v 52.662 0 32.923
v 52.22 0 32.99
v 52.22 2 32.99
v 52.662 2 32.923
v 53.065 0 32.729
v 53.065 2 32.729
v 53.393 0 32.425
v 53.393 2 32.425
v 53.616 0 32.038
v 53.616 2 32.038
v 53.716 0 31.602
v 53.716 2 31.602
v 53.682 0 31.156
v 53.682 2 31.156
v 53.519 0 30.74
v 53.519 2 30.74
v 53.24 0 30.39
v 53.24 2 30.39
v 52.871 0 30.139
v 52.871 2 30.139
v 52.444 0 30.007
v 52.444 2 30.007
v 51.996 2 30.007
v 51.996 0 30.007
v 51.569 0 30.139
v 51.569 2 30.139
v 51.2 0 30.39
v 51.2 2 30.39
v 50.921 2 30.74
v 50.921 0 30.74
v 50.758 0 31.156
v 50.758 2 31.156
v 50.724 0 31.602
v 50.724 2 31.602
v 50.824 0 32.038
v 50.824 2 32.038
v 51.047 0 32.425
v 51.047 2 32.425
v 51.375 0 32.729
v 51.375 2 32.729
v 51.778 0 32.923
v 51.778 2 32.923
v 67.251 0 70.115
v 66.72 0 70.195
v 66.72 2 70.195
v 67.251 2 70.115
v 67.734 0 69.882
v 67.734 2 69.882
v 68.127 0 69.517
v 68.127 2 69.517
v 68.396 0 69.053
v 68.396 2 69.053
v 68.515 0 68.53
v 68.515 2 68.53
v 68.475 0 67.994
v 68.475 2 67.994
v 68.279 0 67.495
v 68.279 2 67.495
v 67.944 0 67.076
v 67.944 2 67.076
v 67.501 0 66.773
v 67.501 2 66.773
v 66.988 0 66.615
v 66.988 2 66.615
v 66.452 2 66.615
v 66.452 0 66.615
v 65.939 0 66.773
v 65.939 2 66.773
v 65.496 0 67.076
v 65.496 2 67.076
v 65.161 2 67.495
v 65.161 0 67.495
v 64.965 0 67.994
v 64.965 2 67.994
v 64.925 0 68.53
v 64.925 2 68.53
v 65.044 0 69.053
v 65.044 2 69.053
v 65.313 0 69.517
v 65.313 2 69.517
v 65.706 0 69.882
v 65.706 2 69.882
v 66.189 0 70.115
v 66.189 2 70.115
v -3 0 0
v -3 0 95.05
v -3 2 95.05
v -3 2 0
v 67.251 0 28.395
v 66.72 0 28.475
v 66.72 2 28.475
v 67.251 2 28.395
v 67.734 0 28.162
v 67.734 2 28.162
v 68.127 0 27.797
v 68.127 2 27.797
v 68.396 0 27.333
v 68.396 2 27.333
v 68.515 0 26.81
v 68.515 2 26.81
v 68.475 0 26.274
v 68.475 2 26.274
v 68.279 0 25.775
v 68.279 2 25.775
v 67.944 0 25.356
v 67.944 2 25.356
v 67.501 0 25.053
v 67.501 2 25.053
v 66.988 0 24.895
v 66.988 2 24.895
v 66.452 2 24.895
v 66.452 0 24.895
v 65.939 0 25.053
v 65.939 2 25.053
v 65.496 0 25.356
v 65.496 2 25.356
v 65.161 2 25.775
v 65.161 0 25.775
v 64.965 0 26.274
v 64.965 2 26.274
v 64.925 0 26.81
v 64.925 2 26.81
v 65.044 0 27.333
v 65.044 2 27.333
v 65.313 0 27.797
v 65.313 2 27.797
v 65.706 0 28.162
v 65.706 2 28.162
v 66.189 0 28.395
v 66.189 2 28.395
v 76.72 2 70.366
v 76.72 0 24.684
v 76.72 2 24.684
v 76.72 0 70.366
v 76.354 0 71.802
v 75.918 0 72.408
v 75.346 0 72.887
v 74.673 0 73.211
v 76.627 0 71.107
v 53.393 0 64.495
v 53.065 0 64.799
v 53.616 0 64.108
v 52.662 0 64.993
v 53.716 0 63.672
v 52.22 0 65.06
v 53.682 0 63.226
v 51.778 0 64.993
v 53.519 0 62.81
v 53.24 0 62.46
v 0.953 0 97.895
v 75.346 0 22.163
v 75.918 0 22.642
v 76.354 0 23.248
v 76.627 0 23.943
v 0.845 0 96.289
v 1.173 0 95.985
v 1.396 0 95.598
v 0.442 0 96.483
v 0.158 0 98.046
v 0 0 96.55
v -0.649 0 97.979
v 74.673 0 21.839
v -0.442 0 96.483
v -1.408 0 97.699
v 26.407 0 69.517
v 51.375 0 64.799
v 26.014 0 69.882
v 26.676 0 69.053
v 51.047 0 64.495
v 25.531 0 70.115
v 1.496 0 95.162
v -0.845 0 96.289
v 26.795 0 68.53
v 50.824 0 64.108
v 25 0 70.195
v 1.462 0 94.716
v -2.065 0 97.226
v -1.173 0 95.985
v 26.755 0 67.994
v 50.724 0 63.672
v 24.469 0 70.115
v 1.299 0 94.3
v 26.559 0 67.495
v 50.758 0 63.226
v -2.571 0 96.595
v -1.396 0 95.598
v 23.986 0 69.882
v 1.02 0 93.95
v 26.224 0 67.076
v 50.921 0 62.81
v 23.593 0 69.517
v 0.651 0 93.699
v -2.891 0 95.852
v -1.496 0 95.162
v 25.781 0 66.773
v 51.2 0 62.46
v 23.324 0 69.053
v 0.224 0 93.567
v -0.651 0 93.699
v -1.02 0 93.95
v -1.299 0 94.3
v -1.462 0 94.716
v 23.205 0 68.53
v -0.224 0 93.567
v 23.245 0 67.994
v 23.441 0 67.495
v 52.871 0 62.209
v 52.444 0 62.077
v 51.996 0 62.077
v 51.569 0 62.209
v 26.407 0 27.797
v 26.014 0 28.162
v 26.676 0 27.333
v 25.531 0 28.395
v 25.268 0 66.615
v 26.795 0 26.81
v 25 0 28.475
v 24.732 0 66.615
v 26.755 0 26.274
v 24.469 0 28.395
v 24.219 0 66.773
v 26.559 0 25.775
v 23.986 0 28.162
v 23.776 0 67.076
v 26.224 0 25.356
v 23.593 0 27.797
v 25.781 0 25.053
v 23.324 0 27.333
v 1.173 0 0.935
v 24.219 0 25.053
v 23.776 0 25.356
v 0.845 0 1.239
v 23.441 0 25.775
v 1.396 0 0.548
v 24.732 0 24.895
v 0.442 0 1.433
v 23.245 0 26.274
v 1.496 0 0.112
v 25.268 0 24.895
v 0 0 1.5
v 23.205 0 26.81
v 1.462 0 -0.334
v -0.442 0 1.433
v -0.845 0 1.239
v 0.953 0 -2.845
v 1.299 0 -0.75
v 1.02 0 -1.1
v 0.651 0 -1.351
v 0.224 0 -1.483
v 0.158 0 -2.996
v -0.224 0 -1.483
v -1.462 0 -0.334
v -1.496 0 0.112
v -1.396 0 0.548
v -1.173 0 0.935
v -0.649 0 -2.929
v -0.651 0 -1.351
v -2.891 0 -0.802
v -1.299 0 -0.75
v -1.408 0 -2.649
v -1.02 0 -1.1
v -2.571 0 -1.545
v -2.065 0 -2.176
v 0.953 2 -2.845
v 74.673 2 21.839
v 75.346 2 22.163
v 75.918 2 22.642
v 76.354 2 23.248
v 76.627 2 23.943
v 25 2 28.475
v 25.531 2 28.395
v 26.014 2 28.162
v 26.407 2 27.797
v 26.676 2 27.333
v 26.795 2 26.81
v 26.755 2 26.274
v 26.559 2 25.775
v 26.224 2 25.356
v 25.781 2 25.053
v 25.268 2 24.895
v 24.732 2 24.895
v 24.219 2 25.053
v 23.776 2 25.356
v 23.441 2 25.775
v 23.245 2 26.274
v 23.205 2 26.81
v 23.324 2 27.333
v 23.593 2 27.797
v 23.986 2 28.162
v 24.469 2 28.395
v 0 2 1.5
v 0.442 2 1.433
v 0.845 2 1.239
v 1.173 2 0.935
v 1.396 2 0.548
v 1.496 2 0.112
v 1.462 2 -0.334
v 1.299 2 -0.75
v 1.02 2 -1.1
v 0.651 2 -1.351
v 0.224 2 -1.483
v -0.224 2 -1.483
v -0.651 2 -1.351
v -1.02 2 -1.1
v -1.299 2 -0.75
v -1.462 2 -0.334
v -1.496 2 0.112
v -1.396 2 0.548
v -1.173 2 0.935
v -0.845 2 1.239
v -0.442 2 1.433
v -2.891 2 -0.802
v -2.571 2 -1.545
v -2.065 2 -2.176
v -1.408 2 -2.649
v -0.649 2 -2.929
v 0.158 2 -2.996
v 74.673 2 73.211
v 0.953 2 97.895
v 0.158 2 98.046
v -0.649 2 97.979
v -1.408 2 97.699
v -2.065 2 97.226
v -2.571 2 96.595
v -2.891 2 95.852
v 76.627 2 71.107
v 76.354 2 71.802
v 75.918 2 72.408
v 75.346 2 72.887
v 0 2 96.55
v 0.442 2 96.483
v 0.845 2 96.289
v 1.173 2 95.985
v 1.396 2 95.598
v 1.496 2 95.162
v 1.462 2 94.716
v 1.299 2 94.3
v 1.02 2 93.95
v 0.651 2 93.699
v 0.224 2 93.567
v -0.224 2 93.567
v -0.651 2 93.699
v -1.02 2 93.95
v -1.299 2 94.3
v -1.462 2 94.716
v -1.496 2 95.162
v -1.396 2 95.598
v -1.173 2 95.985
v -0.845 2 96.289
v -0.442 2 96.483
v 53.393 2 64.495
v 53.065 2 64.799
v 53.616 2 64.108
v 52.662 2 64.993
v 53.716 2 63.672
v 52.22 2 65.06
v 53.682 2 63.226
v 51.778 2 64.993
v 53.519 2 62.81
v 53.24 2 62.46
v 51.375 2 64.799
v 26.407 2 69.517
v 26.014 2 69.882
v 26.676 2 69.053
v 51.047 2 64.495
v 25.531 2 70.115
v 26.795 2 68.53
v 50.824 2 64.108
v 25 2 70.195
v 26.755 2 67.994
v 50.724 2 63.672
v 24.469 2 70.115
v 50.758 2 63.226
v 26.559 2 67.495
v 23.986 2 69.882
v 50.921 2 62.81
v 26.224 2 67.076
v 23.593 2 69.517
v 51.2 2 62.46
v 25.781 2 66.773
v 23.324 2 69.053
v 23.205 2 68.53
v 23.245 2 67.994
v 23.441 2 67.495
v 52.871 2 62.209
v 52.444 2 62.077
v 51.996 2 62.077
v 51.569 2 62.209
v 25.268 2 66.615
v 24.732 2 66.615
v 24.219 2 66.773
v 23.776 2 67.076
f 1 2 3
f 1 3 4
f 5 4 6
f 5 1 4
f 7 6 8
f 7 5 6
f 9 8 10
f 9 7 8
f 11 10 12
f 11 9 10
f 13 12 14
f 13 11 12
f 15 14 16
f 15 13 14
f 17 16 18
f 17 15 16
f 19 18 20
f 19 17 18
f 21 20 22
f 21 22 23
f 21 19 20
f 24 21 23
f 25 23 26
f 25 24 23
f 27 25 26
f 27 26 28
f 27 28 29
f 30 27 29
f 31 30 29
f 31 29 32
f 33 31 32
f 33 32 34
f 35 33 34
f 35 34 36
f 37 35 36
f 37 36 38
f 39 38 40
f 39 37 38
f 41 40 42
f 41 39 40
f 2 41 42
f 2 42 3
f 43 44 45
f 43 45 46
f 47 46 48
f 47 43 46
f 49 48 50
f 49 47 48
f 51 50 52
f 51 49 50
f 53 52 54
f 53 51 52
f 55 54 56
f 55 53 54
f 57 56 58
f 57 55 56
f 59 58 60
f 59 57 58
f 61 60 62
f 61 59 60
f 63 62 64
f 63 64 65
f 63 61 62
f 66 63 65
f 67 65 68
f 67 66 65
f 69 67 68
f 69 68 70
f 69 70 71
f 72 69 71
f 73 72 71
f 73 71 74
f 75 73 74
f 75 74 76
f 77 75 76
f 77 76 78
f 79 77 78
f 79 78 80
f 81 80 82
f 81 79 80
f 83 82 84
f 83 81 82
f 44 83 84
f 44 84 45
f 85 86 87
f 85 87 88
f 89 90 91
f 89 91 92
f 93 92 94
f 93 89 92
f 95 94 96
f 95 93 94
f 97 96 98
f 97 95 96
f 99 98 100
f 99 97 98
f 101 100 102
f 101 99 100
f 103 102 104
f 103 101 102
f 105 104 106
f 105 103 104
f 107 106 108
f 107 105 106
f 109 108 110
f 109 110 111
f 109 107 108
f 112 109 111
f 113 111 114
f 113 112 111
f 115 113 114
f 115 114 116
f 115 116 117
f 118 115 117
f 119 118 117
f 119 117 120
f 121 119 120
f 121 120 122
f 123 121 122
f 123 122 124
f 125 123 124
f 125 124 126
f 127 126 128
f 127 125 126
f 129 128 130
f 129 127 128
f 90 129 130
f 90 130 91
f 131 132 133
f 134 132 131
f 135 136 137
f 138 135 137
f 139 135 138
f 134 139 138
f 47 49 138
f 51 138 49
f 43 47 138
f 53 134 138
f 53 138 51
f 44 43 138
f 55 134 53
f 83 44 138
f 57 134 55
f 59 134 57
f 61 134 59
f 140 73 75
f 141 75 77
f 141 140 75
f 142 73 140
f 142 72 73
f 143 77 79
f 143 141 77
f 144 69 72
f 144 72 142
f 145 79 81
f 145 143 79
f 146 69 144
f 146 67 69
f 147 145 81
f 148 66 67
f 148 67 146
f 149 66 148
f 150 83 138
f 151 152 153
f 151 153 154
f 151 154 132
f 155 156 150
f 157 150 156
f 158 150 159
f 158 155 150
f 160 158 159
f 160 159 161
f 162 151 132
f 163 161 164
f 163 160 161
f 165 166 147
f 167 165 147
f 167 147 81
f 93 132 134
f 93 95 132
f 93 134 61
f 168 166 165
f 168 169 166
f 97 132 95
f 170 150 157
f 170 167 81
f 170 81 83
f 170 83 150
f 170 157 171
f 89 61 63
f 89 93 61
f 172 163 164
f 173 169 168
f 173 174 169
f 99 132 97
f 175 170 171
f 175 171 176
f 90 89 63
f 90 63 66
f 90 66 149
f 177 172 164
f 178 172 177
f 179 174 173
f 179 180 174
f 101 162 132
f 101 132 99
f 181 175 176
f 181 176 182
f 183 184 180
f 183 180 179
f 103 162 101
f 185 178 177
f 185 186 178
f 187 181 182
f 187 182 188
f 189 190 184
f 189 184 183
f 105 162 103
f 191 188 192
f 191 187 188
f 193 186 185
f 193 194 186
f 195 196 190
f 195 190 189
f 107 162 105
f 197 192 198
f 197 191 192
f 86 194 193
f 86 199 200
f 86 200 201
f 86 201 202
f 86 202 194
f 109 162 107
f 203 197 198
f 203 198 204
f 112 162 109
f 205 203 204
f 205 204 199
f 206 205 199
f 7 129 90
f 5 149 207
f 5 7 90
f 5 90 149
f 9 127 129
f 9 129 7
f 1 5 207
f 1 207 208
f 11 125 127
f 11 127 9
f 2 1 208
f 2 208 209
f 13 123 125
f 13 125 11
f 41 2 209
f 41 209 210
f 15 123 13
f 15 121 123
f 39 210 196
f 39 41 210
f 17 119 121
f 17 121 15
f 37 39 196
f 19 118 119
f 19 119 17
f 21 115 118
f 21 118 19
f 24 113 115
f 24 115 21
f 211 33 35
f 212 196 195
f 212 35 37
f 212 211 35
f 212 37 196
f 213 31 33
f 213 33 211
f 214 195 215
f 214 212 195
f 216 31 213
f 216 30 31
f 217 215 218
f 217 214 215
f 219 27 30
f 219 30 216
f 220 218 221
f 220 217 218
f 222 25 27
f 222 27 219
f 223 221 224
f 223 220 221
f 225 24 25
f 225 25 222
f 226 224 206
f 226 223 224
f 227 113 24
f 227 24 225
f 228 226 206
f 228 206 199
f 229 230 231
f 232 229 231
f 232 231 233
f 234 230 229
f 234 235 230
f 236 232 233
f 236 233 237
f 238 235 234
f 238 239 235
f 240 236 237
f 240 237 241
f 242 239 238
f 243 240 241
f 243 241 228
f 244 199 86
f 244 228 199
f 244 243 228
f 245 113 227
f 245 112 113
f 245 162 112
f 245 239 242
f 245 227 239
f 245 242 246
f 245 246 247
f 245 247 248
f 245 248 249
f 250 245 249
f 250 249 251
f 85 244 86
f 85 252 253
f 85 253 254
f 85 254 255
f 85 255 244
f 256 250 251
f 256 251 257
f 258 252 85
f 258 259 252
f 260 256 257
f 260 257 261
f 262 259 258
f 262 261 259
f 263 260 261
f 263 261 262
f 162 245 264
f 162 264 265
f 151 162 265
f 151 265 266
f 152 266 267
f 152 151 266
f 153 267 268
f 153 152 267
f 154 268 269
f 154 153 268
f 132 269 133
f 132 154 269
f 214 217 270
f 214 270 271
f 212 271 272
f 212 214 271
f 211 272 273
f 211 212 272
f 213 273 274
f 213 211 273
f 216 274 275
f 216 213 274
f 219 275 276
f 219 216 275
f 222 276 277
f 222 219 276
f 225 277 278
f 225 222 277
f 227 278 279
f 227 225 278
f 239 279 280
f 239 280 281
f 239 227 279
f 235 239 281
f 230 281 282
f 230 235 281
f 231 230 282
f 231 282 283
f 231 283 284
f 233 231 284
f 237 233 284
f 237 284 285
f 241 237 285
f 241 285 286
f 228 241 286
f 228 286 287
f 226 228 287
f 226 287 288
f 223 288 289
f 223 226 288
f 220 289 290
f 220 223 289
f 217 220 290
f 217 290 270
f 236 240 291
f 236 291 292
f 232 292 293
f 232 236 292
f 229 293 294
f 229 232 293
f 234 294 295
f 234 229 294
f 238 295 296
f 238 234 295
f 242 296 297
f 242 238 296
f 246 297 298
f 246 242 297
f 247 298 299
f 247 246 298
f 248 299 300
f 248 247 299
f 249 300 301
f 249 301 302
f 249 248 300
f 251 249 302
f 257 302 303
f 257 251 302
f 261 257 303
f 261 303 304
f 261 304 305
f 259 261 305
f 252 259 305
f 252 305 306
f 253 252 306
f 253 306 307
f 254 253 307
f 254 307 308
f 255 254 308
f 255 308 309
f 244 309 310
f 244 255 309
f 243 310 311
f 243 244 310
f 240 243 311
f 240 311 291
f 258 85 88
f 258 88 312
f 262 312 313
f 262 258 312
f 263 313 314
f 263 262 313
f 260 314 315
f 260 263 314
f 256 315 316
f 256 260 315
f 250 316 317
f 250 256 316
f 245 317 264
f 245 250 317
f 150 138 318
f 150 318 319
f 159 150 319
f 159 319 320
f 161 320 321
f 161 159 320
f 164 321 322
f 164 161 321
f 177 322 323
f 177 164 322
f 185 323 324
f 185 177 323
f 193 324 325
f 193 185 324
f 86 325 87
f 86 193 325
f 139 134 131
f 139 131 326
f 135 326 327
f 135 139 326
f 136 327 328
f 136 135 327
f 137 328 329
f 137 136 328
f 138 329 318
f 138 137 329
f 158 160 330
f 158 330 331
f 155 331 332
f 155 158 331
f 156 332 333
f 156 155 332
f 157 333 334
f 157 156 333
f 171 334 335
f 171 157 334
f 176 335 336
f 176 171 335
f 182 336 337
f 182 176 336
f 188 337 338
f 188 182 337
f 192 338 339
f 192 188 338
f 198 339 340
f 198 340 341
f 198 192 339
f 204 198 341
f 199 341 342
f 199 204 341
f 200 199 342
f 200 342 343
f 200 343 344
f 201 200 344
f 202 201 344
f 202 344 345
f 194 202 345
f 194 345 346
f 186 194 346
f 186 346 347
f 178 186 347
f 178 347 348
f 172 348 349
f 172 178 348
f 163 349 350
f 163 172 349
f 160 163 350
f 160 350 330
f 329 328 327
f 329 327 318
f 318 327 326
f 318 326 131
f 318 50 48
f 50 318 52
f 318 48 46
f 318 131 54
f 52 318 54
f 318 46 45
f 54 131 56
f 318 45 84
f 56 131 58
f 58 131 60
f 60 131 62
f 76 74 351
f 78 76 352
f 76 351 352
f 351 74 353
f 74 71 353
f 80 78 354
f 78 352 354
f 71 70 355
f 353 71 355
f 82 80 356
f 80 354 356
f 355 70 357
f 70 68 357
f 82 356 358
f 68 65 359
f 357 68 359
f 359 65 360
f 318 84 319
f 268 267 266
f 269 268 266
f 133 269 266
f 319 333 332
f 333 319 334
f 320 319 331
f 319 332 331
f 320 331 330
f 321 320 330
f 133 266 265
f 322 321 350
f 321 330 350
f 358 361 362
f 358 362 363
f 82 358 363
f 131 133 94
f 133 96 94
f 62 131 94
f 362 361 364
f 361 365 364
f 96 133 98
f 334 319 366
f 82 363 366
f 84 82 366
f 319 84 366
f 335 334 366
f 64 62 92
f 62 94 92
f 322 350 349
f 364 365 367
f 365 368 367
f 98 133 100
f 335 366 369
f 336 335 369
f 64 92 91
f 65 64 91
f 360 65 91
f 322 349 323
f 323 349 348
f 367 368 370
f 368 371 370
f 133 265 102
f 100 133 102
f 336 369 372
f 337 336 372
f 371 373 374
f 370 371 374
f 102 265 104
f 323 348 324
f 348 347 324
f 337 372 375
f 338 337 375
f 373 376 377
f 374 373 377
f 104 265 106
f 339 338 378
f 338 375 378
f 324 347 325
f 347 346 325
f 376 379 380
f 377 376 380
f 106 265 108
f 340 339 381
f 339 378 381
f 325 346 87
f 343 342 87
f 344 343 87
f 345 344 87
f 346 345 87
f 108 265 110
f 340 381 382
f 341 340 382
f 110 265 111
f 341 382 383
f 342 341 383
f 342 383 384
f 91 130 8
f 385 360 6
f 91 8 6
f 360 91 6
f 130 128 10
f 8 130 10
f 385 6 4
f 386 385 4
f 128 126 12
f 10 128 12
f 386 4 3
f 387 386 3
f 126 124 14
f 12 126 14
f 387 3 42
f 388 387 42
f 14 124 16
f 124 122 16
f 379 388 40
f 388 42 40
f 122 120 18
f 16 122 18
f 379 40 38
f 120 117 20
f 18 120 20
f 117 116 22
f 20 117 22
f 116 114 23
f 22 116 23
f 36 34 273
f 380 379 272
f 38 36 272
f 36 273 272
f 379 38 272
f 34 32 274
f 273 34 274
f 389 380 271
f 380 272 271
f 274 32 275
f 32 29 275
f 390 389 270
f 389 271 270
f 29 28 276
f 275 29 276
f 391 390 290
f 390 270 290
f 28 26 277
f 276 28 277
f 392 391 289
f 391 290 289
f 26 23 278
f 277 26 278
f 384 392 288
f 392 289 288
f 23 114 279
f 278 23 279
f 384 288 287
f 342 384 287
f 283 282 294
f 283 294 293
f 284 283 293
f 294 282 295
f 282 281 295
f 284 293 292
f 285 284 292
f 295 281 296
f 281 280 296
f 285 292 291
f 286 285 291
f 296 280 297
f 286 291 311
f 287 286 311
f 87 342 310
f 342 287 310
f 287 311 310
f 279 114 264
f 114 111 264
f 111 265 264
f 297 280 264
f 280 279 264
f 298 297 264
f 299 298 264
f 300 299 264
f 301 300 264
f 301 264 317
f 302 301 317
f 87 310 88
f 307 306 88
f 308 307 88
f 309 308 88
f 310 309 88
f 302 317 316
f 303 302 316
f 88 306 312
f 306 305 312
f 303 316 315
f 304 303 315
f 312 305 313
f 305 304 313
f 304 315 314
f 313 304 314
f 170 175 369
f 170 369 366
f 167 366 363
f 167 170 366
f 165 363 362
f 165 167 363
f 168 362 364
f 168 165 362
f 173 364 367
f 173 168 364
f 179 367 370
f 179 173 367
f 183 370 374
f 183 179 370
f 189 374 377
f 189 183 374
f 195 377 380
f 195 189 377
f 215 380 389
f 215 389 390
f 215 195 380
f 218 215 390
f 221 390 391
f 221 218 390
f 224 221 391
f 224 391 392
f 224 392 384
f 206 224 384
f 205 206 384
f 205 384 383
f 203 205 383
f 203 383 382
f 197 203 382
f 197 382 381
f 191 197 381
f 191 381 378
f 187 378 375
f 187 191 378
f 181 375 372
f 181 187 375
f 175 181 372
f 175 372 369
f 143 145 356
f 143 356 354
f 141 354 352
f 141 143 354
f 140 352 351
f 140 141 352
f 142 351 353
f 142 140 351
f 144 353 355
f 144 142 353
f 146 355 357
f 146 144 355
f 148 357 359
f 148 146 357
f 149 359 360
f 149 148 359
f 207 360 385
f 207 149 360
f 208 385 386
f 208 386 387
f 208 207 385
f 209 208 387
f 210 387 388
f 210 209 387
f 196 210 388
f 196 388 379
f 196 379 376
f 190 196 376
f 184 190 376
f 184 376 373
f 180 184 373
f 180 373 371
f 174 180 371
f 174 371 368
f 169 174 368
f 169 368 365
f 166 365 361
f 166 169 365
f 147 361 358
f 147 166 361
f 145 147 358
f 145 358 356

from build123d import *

# Parameters (mm, degrees)
CROQUIS1_R              = 1.8
CROQUIS1_R_2            = 1.5
SALIENTE_EXTRUIR1_DEPTH = 2


with BuildPart() as part:
    # Croquis1 → Saliente-Extruir1 (new body)
    with BuildSketch(Plane(origin=(0, 0, 0), x_dir=(1, 0, 0), z_dir=(0, 1, 0))):
        with BuildLine():
            Line((0.952532669, 2.844763877), (74.672532669, -21.839431846))
            ThreePointArc((74.672532669, -21.839431846), (76.154912525, -22.931711487), (76.72, -24.684195722))
            Line((76.72, -24.684195722), (76.72, -70.365804278))
            ThreePointArc((76.72, -70.365804278), (76.154912525, -72.118288513), (74.672532669, -73.210568154))
            Line((74.672532669, -73.210568154), (0.952532669, -97.894763877))
            ThreePointArc((0.952532669, -97.894763877), (-1.752484236, -97.484912525), (-3, -95.05))
            Line((-3, -95.05), (-3, 0))
            ThreePointArc((-3, 0), (-1.752484236, 2.434912525), (0.952532669, 2.844763877))
        make_face()
        with Locations(Location((25, -26.675, 0), (0, 0, 270))):
            Circle(CROQUIS1_R, mode=Mode.SUBTRACT)
        with Locations(Location((25, -68.395, 0), (0, 0, 270))):
            Circle(CROQUIS1_R, mode=Mode.SUBTRACT)
        with Locations(Location((66.72, -26.675, 0), (0, 0, 270))):
            Circle(CROQUIS1_R, mode=Mode.SUBTRACT)
        with Locations(Location((66.72, -68.395, 0), (0, 0, 270))):
            Circle(CROQUIS1_R, mode=Mode.SUBTRACT)
        with Locations(Location((0, 0, 0), (0, 0, 270))):
            Circle(CROQUIS1_R_2, mode=Mode.SUBTRACT)
        with Locations(Location((0, -95.05, 0), (0, 0, 270))):
            Circle(CROQUIS1_R_2, mode=Mode.SUBTRACT)
        with Locations(Location((52.22, -31.49, 0), (0, 0, 270))):
            Circle(CROQUIS1_R_2, mode=Mode.SUBTRACT)
        with Locations(Location((52.22, -63.56, 0), (0, 0, 270))):
            Circle(CROQUIS1_R_2, mode=Mode.SUBTRACT)
    extrude(amount=SALIENTE_EXTRUIR1_DEPTH)


solid = part.part
